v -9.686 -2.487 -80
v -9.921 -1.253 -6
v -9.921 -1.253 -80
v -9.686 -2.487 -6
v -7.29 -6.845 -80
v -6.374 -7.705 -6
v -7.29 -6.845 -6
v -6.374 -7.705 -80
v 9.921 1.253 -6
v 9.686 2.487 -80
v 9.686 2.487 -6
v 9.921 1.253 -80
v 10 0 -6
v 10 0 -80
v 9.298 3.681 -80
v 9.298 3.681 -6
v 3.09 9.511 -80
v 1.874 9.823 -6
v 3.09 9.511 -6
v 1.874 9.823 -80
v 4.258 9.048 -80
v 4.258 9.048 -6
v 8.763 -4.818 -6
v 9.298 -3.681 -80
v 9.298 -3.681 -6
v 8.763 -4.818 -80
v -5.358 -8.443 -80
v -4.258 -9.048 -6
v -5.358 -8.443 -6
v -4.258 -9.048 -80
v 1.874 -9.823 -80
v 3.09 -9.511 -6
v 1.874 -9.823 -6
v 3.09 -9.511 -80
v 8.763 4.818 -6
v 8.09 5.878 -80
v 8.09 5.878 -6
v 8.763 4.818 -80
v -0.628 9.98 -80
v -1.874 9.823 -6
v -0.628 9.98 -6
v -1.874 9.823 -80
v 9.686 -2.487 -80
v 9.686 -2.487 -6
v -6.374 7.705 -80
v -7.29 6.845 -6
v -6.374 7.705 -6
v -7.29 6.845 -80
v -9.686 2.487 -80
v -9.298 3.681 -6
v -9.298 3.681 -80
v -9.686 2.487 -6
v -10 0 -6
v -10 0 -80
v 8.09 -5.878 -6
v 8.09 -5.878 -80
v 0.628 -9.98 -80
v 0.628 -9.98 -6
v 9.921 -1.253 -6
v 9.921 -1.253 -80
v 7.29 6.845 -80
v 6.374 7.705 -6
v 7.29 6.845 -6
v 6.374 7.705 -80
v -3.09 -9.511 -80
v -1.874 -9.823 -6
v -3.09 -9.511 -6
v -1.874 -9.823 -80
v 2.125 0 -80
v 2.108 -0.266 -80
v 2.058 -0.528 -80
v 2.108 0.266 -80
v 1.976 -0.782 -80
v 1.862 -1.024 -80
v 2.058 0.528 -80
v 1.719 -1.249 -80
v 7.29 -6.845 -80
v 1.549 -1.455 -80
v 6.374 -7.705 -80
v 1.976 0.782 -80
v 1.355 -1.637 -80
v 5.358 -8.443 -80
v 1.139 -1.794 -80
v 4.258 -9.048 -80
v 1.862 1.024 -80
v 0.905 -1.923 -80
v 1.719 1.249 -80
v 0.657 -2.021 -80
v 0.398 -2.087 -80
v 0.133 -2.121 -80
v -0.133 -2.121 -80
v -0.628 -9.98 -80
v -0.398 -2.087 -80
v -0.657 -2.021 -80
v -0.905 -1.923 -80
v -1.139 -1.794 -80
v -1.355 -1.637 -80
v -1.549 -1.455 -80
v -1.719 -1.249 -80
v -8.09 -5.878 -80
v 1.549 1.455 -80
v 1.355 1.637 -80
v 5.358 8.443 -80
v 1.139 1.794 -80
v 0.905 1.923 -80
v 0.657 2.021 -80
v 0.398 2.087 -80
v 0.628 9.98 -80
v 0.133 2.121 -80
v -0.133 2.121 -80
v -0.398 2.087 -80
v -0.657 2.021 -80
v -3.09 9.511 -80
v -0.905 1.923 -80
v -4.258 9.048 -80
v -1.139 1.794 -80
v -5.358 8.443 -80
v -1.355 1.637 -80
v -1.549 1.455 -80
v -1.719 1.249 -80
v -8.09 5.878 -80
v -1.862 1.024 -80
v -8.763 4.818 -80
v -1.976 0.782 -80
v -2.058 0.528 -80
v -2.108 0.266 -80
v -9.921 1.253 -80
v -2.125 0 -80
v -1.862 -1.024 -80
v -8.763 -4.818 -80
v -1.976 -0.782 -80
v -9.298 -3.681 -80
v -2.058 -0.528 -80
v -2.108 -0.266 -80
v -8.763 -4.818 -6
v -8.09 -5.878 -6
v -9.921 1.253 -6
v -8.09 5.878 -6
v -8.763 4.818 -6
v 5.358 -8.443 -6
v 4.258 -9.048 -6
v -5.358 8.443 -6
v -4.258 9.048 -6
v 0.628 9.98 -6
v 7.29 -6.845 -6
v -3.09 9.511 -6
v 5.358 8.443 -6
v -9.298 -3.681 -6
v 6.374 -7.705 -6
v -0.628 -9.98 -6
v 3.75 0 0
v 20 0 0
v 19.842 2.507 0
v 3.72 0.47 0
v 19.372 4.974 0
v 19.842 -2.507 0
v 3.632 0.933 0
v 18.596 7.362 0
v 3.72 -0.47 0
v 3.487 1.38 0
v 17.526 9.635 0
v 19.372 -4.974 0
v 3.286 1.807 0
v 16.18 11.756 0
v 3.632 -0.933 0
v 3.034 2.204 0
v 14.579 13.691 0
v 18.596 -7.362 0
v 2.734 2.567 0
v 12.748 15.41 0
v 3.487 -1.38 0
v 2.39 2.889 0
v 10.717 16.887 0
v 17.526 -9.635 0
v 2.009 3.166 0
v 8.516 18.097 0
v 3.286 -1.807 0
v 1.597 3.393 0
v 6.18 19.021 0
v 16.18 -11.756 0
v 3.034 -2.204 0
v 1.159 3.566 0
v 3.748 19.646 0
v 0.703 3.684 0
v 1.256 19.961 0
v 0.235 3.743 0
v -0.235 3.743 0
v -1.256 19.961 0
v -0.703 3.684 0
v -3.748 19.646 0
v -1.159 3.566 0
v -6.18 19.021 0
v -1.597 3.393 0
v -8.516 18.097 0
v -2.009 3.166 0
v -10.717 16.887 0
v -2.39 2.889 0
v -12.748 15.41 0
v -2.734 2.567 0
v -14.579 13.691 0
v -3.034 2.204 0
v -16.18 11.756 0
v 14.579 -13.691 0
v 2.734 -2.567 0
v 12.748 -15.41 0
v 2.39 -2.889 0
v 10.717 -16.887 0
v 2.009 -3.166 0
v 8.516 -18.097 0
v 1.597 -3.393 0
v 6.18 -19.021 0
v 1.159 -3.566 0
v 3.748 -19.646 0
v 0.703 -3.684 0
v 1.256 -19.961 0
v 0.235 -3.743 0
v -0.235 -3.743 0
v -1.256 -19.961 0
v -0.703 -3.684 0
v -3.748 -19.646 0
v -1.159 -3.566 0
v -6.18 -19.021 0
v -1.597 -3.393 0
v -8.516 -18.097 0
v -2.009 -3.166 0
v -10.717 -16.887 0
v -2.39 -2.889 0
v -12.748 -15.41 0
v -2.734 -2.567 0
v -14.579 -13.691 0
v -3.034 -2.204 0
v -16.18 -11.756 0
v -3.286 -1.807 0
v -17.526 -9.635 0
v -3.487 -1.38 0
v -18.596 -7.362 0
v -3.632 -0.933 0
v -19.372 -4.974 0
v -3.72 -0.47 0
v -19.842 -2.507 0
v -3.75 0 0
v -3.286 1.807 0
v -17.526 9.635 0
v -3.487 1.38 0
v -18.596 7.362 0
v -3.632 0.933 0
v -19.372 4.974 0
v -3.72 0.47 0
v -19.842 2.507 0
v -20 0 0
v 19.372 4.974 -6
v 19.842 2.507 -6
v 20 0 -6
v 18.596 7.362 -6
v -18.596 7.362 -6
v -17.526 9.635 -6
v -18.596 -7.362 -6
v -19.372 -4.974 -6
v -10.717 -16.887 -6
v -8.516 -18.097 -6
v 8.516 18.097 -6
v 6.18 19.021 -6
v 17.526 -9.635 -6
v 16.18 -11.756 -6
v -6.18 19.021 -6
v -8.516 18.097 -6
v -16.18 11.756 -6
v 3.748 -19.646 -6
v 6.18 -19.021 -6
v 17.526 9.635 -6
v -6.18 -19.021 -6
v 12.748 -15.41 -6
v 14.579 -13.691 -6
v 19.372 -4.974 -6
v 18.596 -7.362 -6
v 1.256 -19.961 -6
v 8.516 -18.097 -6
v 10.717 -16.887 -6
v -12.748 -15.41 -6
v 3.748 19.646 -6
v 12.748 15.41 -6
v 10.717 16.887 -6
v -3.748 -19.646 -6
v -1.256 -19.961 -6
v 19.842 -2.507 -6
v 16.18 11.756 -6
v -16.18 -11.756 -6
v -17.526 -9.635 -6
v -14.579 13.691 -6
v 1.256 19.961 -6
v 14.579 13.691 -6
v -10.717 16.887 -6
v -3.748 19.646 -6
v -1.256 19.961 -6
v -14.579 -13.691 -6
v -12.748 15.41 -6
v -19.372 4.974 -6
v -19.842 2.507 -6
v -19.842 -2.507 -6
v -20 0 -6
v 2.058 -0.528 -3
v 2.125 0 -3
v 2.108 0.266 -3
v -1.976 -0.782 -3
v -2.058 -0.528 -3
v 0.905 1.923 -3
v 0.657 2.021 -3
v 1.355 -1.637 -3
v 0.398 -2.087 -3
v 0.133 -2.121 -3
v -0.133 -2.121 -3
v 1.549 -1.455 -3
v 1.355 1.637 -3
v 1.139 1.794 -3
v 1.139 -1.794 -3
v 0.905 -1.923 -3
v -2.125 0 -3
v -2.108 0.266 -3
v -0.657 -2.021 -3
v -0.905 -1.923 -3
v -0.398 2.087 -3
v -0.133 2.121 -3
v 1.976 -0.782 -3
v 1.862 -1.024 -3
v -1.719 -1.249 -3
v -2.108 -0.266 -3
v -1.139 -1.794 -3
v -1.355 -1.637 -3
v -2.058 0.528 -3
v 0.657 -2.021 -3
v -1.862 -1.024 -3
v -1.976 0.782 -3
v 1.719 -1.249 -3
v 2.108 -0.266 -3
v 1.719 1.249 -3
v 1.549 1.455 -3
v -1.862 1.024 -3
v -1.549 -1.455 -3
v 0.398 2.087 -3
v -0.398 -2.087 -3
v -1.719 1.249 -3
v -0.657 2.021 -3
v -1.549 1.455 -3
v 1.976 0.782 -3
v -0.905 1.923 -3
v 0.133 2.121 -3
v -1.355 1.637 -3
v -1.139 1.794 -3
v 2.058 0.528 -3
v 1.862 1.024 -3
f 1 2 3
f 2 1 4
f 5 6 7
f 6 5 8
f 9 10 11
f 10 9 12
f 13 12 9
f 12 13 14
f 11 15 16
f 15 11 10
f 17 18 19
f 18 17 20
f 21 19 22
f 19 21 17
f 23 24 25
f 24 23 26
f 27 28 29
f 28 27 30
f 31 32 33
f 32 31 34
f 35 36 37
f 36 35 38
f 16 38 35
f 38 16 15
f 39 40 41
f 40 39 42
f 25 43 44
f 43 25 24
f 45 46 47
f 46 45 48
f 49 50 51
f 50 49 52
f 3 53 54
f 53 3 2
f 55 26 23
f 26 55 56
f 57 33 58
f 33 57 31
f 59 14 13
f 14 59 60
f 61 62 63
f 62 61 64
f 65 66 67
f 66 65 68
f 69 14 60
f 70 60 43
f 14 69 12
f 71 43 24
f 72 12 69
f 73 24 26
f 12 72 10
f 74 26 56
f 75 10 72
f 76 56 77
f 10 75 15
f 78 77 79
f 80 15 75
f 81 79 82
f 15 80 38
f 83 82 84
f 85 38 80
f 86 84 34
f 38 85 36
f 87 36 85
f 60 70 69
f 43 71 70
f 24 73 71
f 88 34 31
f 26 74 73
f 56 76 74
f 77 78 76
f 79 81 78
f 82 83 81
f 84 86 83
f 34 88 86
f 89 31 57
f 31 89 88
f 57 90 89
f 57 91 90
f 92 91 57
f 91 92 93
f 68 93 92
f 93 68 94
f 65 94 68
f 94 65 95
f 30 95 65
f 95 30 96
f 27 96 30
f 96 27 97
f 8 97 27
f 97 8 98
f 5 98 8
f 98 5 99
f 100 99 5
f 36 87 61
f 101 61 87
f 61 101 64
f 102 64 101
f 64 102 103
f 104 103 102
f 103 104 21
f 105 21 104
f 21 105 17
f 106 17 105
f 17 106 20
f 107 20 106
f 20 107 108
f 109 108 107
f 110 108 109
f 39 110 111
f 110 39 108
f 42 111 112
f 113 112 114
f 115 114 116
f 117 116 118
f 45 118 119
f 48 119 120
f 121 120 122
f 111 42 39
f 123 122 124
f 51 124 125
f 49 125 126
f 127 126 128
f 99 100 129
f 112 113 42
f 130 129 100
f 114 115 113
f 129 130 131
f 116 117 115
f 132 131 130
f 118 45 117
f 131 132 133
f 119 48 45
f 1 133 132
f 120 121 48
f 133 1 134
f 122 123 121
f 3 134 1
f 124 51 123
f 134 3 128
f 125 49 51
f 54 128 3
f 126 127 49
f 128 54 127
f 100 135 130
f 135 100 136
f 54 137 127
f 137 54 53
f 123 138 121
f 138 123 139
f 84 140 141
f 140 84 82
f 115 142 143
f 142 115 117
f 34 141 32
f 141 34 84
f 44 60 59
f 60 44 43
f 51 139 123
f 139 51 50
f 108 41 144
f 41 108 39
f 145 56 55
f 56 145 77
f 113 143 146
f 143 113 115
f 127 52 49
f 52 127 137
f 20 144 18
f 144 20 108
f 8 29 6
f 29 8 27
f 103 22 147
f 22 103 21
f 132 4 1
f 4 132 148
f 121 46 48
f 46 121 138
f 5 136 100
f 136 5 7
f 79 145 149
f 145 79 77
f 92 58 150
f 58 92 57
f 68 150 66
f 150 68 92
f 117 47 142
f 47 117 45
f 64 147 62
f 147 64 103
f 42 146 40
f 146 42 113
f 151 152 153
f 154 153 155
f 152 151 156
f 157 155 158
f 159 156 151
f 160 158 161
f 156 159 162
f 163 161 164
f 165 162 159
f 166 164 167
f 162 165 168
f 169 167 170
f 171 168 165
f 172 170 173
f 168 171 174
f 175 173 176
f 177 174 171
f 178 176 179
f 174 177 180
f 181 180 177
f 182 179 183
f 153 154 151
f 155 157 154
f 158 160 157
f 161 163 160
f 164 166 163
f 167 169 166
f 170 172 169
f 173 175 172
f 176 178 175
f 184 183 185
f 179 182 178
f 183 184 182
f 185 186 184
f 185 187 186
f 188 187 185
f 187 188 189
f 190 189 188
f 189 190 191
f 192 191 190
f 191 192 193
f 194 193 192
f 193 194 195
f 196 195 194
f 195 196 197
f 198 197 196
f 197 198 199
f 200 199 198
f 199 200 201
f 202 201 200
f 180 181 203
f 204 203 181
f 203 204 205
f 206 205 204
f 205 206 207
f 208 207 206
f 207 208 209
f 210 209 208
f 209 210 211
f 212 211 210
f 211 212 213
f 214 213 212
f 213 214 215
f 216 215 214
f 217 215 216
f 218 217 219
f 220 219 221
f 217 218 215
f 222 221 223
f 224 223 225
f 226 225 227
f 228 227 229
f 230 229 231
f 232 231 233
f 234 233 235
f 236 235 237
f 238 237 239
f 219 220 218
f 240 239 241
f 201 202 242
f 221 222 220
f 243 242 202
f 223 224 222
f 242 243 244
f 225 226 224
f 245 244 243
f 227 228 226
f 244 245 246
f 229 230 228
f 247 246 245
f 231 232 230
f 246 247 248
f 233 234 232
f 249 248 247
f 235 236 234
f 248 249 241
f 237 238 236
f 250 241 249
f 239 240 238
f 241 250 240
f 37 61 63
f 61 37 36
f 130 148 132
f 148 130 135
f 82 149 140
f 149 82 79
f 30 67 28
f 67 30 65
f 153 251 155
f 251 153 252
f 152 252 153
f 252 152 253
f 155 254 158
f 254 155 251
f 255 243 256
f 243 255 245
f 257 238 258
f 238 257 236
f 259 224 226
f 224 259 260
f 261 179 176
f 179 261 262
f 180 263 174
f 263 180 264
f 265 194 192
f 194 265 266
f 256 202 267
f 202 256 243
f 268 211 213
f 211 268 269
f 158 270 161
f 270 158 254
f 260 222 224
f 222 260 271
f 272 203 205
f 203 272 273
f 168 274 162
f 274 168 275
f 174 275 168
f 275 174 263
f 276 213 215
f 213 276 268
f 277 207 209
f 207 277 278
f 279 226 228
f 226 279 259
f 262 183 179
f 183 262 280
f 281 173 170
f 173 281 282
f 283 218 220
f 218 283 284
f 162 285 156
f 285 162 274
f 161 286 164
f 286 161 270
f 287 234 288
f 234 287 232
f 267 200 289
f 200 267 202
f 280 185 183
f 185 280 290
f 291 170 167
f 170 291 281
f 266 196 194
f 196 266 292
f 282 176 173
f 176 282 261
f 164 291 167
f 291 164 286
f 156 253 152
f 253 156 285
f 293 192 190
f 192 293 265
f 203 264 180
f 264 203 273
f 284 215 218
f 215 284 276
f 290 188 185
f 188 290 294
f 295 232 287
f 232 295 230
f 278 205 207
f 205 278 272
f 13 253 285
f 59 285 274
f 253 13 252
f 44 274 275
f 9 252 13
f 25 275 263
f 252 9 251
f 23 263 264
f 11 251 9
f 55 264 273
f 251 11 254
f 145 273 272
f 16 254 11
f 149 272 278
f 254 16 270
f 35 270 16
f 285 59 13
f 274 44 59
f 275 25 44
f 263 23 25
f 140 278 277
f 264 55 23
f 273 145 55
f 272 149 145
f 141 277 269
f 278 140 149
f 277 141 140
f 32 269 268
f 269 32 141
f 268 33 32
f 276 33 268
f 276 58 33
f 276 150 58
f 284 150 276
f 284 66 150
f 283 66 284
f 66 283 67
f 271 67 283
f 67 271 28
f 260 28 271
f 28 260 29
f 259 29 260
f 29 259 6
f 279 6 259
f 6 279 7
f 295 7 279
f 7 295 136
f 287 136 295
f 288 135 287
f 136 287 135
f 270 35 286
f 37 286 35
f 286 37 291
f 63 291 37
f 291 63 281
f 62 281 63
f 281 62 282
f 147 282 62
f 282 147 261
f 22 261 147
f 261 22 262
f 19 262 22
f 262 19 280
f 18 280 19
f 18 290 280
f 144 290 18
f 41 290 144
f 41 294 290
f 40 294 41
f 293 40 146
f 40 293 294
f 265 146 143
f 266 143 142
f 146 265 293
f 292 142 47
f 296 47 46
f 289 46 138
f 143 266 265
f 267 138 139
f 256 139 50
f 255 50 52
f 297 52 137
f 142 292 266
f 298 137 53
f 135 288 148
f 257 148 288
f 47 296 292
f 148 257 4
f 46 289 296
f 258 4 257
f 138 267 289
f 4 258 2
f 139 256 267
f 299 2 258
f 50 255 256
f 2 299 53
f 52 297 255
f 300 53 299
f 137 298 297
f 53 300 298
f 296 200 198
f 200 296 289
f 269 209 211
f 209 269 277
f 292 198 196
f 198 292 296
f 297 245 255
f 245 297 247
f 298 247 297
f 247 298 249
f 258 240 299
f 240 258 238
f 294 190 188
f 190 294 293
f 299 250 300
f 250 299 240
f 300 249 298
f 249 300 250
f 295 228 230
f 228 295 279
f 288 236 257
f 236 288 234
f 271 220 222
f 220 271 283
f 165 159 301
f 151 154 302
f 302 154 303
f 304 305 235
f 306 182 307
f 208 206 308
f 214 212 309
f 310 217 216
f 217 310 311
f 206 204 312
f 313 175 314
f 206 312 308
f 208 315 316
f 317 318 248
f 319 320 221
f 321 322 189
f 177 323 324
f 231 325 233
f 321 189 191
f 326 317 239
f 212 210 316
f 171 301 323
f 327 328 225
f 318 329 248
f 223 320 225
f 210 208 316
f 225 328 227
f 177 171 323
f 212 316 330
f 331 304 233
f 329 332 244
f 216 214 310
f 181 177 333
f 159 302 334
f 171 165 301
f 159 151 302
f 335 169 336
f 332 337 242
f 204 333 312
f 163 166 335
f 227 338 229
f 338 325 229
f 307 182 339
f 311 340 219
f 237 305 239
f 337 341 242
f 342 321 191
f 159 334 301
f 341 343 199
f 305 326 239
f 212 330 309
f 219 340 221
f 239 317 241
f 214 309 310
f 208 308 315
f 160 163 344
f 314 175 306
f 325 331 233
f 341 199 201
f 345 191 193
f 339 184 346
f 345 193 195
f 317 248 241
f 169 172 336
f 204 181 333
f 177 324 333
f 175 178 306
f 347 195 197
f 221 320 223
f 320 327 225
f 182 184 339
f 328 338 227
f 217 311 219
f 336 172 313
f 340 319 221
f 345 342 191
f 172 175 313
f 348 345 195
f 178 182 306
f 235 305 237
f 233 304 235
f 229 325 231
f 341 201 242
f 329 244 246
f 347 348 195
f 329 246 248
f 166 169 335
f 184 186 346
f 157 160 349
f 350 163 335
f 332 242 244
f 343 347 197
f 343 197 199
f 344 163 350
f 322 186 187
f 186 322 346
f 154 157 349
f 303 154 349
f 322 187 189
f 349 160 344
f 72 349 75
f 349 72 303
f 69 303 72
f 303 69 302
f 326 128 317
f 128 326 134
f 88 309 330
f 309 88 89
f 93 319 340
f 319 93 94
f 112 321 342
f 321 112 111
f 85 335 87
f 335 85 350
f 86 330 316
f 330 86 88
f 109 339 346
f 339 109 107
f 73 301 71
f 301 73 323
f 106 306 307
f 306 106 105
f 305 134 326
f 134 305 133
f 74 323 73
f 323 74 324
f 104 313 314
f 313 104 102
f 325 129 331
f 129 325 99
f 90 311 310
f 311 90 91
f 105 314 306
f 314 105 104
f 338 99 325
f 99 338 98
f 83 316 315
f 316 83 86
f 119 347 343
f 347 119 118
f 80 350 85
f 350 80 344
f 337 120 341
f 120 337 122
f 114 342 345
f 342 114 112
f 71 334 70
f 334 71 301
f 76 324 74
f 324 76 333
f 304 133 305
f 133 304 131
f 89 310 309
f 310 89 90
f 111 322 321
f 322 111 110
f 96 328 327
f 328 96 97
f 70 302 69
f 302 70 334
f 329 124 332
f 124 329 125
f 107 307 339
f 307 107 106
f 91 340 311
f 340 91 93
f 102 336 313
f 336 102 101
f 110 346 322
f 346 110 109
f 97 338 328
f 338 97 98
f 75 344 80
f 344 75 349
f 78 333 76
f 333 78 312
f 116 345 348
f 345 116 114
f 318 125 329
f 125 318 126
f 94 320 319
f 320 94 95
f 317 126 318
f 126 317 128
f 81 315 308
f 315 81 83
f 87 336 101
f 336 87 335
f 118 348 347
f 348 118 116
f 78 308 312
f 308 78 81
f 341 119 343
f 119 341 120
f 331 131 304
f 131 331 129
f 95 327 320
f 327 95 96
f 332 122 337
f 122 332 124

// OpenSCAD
$fn = 50;


difference() {
	union() {
		translate(v = [0, 0, -80.0000000000]) {
			cylinder(h = 80, r = 10.0000000000);
		}
		translate(v = [0, 0, -6.0000000000]) {
			cylinder(h = 6, r = 20.0000000000);
		}
	}
	union() {
		translate(v = [0, 0, 0]) {
			rotate(a = [0, 0, 0]) {
				difference() {
					union() {
						#translate(v = [0, 0, -80.0000000000]) {
							cylinder(h = 80, r = 2.0000000000);
						}
						#translate(v = [0, 0, -3]) {
							cylinder(h = 3, r1 = 2.1250000000, r2 = 3.7500000000);
						}
						#translate(v = [0, 0, -80.0000000000]) {
							cylinder(h = 80, r = 2.1250000000);
						}
						#translate(v = [0, 0, -80.0000000000]) {
							cylinder(h = 80, r = 2.0000000000);
						}
					}
					union();
				}
			}
		}
	}
}
